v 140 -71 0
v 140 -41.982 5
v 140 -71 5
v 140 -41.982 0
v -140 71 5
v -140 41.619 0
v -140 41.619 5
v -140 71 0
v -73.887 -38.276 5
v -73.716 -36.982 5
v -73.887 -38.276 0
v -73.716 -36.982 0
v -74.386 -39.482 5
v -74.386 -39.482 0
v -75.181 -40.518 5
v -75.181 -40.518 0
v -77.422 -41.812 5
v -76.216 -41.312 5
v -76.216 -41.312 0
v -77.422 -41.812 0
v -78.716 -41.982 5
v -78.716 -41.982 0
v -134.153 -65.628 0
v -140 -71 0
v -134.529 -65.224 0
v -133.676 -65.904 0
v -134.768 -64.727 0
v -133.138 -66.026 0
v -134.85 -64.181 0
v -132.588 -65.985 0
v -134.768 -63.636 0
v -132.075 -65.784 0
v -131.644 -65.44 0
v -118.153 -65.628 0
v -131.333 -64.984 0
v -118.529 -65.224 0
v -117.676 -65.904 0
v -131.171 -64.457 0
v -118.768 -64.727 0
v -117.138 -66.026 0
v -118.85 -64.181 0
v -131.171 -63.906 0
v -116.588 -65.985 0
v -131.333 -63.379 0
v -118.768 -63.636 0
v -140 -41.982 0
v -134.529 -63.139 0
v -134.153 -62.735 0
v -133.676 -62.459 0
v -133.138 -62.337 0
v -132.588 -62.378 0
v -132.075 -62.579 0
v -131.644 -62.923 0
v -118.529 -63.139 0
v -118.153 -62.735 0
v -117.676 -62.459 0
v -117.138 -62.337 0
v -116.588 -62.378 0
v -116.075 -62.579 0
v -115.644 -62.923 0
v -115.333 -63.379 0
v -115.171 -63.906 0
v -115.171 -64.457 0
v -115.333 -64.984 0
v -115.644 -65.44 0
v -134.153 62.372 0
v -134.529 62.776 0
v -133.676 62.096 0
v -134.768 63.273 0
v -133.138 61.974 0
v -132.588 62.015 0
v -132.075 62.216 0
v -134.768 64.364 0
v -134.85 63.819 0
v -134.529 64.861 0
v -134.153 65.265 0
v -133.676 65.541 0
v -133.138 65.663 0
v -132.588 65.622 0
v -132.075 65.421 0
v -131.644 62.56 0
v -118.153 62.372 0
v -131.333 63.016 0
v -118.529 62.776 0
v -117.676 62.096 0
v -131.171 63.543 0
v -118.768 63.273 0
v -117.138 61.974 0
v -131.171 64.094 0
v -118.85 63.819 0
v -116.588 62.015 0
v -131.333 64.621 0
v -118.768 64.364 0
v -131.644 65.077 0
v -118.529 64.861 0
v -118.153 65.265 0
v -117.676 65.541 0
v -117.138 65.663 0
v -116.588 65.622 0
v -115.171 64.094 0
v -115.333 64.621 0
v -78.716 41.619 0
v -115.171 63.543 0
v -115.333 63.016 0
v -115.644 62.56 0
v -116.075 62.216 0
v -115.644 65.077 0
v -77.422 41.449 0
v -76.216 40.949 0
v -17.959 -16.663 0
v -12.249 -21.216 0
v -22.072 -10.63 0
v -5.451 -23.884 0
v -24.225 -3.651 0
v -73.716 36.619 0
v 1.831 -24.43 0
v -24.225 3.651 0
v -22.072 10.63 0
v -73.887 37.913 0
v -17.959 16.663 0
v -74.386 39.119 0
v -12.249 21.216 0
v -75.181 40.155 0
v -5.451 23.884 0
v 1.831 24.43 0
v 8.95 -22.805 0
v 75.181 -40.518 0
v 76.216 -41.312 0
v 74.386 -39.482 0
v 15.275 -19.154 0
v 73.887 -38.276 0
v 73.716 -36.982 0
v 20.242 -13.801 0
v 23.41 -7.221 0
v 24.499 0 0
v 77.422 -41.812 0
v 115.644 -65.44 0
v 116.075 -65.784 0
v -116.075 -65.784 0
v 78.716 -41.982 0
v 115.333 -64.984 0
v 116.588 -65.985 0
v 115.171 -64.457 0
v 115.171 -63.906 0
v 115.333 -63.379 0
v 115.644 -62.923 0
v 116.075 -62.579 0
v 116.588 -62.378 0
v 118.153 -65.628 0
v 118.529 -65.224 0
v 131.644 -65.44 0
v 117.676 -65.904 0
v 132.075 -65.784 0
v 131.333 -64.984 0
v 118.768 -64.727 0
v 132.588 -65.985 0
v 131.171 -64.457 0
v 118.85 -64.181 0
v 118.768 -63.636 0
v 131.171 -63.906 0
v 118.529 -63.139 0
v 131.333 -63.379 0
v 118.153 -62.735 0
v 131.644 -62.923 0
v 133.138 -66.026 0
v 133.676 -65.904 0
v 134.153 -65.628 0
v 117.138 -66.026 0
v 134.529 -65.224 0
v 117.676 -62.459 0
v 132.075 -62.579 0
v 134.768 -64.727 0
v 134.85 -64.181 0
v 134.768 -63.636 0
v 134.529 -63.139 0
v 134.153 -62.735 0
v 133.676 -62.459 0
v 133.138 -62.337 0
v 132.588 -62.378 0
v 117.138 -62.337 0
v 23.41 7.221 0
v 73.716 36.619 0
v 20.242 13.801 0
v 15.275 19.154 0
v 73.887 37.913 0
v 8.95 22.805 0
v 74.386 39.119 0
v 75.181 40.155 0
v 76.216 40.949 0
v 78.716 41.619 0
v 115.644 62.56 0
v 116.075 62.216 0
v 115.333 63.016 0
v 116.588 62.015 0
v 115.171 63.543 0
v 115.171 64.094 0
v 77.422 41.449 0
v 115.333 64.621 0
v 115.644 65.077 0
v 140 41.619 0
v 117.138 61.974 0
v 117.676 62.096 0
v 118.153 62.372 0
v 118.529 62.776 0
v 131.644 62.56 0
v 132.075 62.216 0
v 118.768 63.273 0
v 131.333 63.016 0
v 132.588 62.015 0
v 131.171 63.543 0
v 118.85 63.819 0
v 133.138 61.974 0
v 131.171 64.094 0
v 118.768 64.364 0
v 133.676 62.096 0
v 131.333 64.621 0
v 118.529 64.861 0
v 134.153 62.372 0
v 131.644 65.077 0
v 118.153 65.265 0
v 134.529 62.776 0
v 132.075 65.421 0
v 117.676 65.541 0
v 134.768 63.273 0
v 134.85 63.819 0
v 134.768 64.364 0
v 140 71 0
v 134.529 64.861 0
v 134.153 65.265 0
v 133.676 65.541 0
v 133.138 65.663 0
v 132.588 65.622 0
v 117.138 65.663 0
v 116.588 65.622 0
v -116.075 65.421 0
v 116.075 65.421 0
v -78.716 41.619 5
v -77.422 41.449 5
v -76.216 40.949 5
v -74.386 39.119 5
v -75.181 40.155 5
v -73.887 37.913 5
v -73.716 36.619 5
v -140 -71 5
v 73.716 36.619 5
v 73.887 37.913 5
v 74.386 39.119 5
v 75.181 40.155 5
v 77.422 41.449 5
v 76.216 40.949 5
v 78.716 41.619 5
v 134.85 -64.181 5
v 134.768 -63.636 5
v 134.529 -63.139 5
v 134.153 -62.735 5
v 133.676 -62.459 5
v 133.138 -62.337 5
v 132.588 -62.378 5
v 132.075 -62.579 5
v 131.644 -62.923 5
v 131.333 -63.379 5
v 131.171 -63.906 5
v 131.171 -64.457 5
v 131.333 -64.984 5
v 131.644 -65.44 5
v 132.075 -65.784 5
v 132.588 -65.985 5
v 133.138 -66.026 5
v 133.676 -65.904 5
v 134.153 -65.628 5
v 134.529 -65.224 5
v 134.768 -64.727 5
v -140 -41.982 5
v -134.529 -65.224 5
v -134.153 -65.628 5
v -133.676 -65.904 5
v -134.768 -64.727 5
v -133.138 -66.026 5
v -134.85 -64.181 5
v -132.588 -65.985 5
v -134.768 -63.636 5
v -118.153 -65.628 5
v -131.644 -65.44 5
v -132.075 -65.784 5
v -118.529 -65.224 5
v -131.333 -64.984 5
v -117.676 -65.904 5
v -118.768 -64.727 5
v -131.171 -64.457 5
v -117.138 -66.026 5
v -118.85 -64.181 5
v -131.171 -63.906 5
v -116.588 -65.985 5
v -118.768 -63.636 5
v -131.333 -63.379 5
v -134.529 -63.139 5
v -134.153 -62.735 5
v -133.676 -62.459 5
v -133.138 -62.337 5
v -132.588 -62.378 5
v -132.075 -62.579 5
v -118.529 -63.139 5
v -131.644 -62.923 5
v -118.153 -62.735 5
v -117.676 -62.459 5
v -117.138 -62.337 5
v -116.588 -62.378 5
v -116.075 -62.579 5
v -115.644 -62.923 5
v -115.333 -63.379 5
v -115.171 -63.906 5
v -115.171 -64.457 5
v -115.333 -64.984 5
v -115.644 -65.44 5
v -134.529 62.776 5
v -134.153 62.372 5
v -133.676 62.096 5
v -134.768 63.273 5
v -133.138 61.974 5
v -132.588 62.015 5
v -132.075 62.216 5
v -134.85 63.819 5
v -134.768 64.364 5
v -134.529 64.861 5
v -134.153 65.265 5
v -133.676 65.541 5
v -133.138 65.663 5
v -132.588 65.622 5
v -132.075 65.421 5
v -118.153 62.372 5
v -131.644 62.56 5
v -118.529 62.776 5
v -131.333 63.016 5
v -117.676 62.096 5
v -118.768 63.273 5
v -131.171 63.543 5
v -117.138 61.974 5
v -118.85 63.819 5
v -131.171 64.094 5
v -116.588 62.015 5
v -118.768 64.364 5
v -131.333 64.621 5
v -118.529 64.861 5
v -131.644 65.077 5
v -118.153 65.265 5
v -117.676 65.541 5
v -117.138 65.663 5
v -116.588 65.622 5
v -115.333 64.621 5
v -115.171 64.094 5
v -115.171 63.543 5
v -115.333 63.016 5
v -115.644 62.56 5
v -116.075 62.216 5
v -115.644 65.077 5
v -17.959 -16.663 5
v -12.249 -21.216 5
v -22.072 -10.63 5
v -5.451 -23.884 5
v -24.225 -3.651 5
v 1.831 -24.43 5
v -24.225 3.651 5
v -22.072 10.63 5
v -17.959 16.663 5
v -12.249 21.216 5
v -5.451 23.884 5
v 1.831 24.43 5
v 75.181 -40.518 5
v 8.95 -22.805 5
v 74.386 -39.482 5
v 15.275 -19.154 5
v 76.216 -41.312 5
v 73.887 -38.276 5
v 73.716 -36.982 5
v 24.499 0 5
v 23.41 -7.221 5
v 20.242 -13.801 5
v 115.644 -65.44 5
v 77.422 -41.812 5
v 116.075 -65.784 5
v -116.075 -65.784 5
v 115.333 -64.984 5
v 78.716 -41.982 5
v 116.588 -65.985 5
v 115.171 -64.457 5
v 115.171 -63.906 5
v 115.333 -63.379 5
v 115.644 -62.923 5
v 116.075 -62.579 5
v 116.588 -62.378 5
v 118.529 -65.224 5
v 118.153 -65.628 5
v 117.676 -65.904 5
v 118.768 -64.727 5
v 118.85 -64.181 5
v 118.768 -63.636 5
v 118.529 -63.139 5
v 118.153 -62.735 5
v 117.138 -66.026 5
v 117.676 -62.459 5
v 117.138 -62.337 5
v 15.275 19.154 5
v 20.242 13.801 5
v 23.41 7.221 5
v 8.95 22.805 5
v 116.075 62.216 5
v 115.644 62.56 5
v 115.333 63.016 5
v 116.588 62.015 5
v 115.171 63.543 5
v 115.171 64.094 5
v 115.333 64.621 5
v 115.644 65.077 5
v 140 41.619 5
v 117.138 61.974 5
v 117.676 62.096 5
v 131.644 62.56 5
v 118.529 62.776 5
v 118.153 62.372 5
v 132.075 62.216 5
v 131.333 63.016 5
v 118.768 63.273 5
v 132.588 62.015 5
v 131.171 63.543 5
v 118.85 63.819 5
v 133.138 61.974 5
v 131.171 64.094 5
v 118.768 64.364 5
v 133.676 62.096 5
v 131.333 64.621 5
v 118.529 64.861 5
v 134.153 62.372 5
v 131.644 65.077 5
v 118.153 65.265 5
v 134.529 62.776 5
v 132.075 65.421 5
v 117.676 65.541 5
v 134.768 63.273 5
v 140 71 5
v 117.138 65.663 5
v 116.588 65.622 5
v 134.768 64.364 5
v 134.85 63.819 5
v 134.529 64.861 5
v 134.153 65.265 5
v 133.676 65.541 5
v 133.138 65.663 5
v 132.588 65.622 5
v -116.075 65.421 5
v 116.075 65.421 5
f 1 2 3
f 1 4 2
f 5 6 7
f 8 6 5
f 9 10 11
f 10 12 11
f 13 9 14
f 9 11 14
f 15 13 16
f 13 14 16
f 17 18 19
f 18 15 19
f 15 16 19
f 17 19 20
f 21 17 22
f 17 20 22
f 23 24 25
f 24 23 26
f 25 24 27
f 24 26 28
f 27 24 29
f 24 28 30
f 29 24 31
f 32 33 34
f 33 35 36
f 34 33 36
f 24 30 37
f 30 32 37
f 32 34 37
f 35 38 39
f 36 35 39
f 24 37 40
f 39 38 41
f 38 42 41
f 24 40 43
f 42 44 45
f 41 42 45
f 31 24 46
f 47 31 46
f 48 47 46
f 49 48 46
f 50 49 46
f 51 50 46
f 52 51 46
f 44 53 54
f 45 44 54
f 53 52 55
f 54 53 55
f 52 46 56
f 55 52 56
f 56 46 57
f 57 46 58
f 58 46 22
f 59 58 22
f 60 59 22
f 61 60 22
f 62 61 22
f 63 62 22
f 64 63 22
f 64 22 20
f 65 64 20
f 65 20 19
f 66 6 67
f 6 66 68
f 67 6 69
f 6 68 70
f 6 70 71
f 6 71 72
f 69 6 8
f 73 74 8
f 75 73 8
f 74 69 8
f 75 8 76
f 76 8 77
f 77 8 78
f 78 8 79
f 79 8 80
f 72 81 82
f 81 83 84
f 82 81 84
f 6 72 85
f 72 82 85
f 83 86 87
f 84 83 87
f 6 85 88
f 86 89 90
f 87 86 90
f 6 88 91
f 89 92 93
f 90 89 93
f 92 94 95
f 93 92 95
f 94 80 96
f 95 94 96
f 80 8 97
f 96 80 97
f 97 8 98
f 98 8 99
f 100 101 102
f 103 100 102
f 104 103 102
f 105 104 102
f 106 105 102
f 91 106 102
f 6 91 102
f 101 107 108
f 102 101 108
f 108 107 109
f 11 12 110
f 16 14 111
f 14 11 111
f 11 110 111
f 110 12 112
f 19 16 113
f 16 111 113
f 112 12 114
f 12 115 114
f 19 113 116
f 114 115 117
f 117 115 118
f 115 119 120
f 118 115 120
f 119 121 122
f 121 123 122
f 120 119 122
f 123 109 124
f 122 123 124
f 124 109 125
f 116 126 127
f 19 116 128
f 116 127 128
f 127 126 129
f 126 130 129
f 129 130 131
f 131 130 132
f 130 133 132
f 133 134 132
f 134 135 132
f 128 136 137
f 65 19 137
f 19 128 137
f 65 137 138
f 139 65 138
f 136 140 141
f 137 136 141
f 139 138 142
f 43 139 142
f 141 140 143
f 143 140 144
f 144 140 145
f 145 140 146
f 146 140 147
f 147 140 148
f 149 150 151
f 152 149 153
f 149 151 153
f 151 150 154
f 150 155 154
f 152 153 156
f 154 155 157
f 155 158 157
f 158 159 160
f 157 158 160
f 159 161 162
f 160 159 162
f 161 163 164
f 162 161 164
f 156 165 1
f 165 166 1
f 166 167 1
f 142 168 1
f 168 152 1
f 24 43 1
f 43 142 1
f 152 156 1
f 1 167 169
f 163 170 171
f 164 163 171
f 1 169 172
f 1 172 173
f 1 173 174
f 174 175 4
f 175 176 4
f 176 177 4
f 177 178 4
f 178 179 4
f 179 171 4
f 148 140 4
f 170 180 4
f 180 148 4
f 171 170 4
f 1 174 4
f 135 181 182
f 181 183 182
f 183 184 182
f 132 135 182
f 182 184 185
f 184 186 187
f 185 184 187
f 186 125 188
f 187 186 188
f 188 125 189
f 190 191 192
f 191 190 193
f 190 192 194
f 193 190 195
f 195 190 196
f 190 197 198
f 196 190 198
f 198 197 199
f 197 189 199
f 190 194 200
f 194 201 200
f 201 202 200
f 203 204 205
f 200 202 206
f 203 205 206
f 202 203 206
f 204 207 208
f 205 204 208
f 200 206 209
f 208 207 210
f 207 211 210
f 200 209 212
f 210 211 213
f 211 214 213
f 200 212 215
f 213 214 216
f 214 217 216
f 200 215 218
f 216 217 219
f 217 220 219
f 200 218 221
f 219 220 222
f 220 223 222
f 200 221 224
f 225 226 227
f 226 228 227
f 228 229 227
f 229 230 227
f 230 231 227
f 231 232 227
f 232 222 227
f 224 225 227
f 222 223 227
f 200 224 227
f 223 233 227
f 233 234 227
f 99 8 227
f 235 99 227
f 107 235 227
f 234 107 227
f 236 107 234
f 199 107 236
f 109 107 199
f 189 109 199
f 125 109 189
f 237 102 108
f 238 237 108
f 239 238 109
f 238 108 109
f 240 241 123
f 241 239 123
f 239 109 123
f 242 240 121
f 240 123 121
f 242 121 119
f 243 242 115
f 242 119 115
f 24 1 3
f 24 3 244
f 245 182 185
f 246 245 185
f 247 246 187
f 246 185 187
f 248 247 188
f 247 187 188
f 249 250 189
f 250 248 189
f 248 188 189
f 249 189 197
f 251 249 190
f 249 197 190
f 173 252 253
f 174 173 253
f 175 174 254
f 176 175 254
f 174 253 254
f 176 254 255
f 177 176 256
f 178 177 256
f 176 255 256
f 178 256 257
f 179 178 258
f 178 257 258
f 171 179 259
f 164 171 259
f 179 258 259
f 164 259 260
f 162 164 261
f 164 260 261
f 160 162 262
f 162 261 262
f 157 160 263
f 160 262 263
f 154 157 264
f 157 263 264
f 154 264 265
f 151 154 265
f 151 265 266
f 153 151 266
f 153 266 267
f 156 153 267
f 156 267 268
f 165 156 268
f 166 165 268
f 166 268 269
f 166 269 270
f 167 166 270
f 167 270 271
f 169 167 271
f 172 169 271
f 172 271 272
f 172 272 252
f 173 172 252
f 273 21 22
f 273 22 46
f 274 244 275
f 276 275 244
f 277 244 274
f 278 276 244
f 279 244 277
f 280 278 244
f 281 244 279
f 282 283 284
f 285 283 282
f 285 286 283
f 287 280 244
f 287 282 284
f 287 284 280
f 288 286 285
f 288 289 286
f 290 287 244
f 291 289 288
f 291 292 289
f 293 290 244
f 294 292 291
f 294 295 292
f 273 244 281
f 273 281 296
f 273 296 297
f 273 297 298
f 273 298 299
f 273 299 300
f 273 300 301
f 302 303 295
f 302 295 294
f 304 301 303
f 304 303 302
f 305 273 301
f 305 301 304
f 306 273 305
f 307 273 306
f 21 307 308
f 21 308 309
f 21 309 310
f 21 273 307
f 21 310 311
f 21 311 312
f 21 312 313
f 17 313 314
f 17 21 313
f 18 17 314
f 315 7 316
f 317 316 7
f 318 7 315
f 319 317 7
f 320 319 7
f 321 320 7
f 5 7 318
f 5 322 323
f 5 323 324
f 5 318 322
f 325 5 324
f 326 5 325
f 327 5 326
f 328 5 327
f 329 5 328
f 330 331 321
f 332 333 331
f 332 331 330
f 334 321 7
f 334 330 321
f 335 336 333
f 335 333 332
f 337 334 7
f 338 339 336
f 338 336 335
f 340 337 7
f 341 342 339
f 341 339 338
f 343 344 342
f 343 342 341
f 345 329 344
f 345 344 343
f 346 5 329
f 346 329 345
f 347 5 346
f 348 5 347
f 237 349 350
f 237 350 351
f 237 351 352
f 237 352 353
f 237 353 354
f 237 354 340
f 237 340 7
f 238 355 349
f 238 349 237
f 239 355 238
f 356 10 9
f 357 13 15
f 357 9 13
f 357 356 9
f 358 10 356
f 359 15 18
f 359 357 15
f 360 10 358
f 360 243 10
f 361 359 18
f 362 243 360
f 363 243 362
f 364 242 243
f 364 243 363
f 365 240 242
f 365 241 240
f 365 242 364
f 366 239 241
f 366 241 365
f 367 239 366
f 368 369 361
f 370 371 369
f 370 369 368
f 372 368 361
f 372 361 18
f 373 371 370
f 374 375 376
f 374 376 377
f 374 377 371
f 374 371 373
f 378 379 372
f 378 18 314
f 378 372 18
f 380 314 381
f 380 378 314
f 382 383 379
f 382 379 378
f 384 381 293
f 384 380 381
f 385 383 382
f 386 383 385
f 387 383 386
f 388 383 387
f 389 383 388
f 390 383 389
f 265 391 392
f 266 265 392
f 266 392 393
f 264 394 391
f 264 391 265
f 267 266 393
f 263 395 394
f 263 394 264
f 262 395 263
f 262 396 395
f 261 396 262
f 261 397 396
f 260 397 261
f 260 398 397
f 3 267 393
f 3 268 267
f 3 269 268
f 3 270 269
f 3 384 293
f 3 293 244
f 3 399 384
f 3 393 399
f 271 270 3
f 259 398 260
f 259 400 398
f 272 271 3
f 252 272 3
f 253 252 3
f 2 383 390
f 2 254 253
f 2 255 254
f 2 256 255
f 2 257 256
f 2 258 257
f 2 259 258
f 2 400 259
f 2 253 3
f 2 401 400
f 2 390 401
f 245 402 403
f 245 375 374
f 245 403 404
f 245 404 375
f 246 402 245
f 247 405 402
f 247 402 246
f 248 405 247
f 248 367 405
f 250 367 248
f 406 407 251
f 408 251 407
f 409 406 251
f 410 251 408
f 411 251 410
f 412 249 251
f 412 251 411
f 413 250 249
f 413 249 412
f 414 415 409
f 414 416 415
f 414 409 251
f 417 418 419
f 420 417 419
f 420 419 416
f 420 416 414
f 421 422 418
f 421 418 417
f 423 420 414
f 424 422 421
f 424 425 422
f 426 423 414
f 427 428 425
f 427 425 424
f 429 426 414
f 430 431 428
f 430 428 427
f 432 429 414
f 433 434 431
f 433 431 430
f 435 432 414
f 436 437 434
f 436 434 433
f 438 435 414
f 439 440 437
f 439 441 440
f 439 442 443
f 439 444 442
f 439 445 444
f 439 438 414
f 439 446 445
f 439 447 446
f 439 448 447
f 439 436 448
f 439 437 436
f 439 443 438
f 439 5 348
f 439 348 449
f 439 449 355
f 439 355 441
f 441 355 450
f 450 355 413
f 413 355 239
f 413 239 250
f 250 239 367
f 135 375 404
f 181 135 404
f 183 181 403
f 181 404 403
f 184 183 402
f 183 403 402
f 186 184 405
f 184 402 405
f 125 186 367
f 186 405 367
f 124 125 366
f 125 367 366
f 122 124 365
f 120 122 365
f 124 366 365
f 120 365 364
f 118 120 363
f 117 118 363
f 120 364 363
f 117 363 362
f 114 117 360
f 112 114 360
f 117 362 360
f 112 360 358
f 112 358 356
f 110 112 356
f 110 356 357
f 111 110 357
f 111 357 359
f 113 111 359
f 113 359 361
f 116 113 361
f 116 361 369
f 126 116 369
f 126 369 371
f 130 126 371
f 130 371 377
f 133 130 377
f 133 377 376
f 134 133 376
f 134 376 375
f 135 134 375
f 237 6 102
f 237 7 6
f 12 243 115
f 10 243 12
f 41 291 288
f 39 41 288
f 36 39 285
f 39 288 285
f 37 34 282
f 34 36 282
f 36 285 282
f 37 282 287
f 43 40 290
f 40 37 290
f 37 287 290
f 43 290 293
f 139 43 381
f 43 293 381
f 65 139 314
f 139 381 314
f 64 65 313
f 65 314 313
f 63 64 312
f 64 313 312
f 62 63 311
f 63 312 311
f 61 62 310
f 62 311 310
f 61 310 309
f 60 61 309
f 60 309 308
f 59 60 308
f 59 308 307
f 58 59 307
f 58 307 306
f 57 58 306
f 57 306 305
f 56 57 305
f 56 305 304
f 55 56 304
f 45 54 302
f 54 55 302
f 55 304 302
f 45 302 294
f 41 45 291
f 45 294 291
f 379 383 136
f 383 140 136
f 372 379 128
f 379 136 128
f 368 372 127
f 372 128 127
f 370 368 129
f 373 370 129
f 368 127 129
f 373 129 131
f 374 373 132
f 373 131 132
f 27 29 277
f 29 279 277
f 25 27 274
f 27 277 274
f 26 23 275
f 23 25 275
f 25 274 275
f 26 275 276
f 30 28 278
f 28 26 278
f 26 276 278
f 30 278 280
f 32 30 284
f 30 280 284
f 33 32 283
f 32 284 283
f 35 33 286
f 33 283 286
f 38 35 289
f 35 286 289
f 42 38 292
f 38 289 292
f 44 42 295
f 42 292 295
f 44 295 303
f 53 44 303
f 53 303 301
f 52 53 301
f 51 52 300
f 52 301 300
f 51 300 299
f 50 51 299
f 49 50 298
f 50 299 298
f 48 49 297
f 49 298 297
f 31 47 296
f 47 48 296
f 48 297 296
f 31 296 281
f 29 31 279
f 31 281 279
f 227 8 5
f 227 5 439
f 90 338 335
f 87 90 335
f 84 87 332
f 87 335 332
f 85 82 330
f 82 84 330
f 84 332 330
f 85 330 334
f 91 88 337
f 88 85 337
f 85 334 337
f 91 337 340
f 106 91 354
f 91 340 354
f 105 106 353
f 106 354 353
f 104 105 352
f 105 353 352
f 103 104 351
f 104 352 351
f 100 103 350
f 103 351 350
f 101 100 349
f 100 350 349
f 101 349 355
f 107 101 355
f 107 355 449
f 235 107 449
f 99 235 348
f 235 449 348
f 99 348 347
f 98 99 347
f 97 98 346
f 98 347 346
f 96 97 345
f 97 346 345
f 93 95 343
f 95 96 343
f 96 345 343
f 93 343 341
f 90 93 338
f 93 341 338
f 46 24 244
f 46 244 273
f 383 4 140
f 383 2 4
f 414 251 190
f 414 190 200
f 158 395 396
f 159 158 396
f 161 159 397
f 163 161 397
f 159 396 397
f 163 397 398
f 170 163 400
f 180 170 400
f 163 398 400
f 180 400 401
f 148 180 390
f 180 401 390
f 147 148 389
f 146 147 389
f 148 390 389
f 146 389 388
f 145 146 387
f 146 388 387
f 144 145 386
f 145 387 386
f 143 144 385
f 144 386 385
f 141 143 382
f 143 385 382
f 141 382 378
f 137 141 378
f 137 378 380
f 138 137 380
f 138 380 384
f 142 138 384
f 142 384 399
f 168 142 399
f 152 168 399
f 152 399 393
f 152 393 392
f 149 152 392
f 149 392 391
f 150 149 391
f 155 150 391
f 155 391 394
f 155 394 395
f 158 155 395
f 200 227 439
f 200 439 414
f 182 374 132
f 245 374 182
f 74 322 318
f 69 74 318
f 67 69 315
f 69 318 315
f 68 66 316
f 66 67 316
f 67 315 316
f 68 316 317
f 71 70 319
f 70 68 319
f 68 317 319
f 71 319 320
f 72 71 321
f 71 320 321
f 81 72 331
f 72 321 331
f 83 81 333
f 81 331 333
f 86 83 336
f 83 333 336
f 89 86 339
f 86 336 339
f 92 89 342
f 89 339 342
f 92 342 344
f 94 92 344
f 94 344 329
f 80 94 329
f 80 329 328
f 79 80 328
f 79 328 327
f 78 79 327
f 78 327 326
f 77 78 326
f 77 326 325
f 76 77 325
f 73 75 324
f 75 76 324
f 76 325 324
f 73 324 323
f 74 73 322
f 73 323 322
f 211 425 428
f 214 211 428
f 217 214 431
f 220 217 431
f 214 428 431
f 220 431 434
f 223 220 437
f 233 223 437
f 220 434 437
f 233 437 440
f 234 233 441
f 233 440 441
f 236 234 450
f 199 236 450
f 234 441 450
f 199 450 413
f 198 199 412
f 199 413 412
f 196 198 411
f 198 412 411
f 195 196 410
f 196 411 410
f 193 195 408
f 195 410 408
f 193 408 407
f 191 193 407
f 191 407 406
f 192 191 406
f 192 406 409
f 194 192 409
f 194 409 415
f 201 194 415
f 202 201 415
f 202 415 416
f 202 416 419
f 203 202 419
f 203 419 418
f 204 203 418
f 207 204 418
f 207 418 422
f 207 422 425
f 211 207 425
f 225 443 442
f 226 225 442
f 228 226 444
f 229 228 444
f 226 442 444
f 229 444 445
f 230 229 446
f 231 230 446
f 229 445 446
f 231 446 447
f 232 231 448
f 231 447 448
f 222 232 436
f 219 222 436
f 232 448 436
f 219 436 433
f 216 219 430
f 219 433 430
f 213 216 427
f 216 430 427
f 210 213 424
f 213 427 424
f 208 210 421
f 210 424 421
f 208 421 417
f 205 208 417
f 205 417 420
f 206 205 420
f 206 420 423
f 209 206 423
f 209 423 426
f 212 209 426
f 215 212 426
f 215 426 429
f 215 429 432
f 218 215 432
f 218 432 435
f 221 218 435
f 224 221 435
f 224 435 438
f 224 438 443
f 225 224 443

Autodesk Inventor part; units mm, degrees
ref_plane "YZ Plane" through (0, 0, 0) normal (1, 0, 0) x (0, 1, 0)
ref_plane "XZ Plane" through (0, 0, 0) normal (0, 1, 0) x (-1, 0, 0)
ref_plane "XY Plane" through (0, 0, 0) normal (0, 0, 1) x (1, 0, 0)
sketch "草图1" plane through (0, 0, 0) normal (0, 0, 1) x (1, 0, 0)
  line L0 (140, -71) -> (-140, -71)
  line L1 (-140, -71) -> (-140, 71)
  line L2 (-140, 71) -> (140, 71)
  line L3 (140, 71) -> (140, -71)
  line L4 (140, -71) -> (-140, 71) construction
  line L5 (-140, -71) -> (140, 71) construction
  point P0 (0, 0)
  dimension "d0" = 280
  dimension "d1" = 142
extrude "拉伸1" add sketch "草图1" along normal blind 5
sketch "草图2" plane through (0, 0, 5) normal (0, 0, 1) x (1, 0, 0)
  line L0 (110, 27.873) -> (110, -28.2358) projected
  line L1 (-140, -71) -> (140, -71) projected
  line L2 (0, -71) -> (0, 71)
  line L3 (140, 71) -> (-140, 71) projected
  circle A0 centre (0, 0) radius 24.4986
sketch "草图3" plane through (0, 0, 5) normal (0, 0, 1) x (1, 0, 0)
  point P0 (0, 0)
sketch "草图4" plane through (0, 0, 5) normal (0, 0, 1) x (1, 0, 0)
  circle A0 centre (117, 63.8186) radius 1.85 projected
  circle A1 centre (133, 63.8186) radius 1.85 projected
  circle A2 centre (117, -64.1814) radius 1.85 projected
  circle A3 centre (133, -64.1814) radius 1.85 projected
  line L0 (140, -32.9821) -> (110, -32.9821) projected
  line L1 (110, 32.6193) -> (140, 32.6193) projected
  line L2 (140, -71) -> (140, 71) projected
  line L3 (140, -41.9821) -> (73.7163, -41.9821)
  line L4 (73.7163, -41.9821) -> (73.7163, 41.6193)
  line L5 (73.7163, 41.6193) -> (140, 41.6193)
  line L6 (140, 41.6193) -> (140, -41.9821)
  point P0 (0, 0)
  dimension "d4" = 9
  dimension "d5" = 9
extrude "拉伸2" cut sketch "草图4" against normal blind 5
ref_plane "工作平面1" through (0, 71, 5) normal (1, 0, 0) x (0, 0, -1)
mirror "镜像1" about plane through (0, 71, 5) normal (1, 0, 0) of "拉伸2"
fillet "圆角1" radius 5 4 edges at (73.7163, -41.9821, 2.5) (73.7163, 41.6193, 2.5) (-73.7163, 41.6193, 2.5) (-73.7163, -41.9821, 2.5)
extrude "拉伸3" cut sketch "草图2" against normal blind 10
properties part number "玻纤"
